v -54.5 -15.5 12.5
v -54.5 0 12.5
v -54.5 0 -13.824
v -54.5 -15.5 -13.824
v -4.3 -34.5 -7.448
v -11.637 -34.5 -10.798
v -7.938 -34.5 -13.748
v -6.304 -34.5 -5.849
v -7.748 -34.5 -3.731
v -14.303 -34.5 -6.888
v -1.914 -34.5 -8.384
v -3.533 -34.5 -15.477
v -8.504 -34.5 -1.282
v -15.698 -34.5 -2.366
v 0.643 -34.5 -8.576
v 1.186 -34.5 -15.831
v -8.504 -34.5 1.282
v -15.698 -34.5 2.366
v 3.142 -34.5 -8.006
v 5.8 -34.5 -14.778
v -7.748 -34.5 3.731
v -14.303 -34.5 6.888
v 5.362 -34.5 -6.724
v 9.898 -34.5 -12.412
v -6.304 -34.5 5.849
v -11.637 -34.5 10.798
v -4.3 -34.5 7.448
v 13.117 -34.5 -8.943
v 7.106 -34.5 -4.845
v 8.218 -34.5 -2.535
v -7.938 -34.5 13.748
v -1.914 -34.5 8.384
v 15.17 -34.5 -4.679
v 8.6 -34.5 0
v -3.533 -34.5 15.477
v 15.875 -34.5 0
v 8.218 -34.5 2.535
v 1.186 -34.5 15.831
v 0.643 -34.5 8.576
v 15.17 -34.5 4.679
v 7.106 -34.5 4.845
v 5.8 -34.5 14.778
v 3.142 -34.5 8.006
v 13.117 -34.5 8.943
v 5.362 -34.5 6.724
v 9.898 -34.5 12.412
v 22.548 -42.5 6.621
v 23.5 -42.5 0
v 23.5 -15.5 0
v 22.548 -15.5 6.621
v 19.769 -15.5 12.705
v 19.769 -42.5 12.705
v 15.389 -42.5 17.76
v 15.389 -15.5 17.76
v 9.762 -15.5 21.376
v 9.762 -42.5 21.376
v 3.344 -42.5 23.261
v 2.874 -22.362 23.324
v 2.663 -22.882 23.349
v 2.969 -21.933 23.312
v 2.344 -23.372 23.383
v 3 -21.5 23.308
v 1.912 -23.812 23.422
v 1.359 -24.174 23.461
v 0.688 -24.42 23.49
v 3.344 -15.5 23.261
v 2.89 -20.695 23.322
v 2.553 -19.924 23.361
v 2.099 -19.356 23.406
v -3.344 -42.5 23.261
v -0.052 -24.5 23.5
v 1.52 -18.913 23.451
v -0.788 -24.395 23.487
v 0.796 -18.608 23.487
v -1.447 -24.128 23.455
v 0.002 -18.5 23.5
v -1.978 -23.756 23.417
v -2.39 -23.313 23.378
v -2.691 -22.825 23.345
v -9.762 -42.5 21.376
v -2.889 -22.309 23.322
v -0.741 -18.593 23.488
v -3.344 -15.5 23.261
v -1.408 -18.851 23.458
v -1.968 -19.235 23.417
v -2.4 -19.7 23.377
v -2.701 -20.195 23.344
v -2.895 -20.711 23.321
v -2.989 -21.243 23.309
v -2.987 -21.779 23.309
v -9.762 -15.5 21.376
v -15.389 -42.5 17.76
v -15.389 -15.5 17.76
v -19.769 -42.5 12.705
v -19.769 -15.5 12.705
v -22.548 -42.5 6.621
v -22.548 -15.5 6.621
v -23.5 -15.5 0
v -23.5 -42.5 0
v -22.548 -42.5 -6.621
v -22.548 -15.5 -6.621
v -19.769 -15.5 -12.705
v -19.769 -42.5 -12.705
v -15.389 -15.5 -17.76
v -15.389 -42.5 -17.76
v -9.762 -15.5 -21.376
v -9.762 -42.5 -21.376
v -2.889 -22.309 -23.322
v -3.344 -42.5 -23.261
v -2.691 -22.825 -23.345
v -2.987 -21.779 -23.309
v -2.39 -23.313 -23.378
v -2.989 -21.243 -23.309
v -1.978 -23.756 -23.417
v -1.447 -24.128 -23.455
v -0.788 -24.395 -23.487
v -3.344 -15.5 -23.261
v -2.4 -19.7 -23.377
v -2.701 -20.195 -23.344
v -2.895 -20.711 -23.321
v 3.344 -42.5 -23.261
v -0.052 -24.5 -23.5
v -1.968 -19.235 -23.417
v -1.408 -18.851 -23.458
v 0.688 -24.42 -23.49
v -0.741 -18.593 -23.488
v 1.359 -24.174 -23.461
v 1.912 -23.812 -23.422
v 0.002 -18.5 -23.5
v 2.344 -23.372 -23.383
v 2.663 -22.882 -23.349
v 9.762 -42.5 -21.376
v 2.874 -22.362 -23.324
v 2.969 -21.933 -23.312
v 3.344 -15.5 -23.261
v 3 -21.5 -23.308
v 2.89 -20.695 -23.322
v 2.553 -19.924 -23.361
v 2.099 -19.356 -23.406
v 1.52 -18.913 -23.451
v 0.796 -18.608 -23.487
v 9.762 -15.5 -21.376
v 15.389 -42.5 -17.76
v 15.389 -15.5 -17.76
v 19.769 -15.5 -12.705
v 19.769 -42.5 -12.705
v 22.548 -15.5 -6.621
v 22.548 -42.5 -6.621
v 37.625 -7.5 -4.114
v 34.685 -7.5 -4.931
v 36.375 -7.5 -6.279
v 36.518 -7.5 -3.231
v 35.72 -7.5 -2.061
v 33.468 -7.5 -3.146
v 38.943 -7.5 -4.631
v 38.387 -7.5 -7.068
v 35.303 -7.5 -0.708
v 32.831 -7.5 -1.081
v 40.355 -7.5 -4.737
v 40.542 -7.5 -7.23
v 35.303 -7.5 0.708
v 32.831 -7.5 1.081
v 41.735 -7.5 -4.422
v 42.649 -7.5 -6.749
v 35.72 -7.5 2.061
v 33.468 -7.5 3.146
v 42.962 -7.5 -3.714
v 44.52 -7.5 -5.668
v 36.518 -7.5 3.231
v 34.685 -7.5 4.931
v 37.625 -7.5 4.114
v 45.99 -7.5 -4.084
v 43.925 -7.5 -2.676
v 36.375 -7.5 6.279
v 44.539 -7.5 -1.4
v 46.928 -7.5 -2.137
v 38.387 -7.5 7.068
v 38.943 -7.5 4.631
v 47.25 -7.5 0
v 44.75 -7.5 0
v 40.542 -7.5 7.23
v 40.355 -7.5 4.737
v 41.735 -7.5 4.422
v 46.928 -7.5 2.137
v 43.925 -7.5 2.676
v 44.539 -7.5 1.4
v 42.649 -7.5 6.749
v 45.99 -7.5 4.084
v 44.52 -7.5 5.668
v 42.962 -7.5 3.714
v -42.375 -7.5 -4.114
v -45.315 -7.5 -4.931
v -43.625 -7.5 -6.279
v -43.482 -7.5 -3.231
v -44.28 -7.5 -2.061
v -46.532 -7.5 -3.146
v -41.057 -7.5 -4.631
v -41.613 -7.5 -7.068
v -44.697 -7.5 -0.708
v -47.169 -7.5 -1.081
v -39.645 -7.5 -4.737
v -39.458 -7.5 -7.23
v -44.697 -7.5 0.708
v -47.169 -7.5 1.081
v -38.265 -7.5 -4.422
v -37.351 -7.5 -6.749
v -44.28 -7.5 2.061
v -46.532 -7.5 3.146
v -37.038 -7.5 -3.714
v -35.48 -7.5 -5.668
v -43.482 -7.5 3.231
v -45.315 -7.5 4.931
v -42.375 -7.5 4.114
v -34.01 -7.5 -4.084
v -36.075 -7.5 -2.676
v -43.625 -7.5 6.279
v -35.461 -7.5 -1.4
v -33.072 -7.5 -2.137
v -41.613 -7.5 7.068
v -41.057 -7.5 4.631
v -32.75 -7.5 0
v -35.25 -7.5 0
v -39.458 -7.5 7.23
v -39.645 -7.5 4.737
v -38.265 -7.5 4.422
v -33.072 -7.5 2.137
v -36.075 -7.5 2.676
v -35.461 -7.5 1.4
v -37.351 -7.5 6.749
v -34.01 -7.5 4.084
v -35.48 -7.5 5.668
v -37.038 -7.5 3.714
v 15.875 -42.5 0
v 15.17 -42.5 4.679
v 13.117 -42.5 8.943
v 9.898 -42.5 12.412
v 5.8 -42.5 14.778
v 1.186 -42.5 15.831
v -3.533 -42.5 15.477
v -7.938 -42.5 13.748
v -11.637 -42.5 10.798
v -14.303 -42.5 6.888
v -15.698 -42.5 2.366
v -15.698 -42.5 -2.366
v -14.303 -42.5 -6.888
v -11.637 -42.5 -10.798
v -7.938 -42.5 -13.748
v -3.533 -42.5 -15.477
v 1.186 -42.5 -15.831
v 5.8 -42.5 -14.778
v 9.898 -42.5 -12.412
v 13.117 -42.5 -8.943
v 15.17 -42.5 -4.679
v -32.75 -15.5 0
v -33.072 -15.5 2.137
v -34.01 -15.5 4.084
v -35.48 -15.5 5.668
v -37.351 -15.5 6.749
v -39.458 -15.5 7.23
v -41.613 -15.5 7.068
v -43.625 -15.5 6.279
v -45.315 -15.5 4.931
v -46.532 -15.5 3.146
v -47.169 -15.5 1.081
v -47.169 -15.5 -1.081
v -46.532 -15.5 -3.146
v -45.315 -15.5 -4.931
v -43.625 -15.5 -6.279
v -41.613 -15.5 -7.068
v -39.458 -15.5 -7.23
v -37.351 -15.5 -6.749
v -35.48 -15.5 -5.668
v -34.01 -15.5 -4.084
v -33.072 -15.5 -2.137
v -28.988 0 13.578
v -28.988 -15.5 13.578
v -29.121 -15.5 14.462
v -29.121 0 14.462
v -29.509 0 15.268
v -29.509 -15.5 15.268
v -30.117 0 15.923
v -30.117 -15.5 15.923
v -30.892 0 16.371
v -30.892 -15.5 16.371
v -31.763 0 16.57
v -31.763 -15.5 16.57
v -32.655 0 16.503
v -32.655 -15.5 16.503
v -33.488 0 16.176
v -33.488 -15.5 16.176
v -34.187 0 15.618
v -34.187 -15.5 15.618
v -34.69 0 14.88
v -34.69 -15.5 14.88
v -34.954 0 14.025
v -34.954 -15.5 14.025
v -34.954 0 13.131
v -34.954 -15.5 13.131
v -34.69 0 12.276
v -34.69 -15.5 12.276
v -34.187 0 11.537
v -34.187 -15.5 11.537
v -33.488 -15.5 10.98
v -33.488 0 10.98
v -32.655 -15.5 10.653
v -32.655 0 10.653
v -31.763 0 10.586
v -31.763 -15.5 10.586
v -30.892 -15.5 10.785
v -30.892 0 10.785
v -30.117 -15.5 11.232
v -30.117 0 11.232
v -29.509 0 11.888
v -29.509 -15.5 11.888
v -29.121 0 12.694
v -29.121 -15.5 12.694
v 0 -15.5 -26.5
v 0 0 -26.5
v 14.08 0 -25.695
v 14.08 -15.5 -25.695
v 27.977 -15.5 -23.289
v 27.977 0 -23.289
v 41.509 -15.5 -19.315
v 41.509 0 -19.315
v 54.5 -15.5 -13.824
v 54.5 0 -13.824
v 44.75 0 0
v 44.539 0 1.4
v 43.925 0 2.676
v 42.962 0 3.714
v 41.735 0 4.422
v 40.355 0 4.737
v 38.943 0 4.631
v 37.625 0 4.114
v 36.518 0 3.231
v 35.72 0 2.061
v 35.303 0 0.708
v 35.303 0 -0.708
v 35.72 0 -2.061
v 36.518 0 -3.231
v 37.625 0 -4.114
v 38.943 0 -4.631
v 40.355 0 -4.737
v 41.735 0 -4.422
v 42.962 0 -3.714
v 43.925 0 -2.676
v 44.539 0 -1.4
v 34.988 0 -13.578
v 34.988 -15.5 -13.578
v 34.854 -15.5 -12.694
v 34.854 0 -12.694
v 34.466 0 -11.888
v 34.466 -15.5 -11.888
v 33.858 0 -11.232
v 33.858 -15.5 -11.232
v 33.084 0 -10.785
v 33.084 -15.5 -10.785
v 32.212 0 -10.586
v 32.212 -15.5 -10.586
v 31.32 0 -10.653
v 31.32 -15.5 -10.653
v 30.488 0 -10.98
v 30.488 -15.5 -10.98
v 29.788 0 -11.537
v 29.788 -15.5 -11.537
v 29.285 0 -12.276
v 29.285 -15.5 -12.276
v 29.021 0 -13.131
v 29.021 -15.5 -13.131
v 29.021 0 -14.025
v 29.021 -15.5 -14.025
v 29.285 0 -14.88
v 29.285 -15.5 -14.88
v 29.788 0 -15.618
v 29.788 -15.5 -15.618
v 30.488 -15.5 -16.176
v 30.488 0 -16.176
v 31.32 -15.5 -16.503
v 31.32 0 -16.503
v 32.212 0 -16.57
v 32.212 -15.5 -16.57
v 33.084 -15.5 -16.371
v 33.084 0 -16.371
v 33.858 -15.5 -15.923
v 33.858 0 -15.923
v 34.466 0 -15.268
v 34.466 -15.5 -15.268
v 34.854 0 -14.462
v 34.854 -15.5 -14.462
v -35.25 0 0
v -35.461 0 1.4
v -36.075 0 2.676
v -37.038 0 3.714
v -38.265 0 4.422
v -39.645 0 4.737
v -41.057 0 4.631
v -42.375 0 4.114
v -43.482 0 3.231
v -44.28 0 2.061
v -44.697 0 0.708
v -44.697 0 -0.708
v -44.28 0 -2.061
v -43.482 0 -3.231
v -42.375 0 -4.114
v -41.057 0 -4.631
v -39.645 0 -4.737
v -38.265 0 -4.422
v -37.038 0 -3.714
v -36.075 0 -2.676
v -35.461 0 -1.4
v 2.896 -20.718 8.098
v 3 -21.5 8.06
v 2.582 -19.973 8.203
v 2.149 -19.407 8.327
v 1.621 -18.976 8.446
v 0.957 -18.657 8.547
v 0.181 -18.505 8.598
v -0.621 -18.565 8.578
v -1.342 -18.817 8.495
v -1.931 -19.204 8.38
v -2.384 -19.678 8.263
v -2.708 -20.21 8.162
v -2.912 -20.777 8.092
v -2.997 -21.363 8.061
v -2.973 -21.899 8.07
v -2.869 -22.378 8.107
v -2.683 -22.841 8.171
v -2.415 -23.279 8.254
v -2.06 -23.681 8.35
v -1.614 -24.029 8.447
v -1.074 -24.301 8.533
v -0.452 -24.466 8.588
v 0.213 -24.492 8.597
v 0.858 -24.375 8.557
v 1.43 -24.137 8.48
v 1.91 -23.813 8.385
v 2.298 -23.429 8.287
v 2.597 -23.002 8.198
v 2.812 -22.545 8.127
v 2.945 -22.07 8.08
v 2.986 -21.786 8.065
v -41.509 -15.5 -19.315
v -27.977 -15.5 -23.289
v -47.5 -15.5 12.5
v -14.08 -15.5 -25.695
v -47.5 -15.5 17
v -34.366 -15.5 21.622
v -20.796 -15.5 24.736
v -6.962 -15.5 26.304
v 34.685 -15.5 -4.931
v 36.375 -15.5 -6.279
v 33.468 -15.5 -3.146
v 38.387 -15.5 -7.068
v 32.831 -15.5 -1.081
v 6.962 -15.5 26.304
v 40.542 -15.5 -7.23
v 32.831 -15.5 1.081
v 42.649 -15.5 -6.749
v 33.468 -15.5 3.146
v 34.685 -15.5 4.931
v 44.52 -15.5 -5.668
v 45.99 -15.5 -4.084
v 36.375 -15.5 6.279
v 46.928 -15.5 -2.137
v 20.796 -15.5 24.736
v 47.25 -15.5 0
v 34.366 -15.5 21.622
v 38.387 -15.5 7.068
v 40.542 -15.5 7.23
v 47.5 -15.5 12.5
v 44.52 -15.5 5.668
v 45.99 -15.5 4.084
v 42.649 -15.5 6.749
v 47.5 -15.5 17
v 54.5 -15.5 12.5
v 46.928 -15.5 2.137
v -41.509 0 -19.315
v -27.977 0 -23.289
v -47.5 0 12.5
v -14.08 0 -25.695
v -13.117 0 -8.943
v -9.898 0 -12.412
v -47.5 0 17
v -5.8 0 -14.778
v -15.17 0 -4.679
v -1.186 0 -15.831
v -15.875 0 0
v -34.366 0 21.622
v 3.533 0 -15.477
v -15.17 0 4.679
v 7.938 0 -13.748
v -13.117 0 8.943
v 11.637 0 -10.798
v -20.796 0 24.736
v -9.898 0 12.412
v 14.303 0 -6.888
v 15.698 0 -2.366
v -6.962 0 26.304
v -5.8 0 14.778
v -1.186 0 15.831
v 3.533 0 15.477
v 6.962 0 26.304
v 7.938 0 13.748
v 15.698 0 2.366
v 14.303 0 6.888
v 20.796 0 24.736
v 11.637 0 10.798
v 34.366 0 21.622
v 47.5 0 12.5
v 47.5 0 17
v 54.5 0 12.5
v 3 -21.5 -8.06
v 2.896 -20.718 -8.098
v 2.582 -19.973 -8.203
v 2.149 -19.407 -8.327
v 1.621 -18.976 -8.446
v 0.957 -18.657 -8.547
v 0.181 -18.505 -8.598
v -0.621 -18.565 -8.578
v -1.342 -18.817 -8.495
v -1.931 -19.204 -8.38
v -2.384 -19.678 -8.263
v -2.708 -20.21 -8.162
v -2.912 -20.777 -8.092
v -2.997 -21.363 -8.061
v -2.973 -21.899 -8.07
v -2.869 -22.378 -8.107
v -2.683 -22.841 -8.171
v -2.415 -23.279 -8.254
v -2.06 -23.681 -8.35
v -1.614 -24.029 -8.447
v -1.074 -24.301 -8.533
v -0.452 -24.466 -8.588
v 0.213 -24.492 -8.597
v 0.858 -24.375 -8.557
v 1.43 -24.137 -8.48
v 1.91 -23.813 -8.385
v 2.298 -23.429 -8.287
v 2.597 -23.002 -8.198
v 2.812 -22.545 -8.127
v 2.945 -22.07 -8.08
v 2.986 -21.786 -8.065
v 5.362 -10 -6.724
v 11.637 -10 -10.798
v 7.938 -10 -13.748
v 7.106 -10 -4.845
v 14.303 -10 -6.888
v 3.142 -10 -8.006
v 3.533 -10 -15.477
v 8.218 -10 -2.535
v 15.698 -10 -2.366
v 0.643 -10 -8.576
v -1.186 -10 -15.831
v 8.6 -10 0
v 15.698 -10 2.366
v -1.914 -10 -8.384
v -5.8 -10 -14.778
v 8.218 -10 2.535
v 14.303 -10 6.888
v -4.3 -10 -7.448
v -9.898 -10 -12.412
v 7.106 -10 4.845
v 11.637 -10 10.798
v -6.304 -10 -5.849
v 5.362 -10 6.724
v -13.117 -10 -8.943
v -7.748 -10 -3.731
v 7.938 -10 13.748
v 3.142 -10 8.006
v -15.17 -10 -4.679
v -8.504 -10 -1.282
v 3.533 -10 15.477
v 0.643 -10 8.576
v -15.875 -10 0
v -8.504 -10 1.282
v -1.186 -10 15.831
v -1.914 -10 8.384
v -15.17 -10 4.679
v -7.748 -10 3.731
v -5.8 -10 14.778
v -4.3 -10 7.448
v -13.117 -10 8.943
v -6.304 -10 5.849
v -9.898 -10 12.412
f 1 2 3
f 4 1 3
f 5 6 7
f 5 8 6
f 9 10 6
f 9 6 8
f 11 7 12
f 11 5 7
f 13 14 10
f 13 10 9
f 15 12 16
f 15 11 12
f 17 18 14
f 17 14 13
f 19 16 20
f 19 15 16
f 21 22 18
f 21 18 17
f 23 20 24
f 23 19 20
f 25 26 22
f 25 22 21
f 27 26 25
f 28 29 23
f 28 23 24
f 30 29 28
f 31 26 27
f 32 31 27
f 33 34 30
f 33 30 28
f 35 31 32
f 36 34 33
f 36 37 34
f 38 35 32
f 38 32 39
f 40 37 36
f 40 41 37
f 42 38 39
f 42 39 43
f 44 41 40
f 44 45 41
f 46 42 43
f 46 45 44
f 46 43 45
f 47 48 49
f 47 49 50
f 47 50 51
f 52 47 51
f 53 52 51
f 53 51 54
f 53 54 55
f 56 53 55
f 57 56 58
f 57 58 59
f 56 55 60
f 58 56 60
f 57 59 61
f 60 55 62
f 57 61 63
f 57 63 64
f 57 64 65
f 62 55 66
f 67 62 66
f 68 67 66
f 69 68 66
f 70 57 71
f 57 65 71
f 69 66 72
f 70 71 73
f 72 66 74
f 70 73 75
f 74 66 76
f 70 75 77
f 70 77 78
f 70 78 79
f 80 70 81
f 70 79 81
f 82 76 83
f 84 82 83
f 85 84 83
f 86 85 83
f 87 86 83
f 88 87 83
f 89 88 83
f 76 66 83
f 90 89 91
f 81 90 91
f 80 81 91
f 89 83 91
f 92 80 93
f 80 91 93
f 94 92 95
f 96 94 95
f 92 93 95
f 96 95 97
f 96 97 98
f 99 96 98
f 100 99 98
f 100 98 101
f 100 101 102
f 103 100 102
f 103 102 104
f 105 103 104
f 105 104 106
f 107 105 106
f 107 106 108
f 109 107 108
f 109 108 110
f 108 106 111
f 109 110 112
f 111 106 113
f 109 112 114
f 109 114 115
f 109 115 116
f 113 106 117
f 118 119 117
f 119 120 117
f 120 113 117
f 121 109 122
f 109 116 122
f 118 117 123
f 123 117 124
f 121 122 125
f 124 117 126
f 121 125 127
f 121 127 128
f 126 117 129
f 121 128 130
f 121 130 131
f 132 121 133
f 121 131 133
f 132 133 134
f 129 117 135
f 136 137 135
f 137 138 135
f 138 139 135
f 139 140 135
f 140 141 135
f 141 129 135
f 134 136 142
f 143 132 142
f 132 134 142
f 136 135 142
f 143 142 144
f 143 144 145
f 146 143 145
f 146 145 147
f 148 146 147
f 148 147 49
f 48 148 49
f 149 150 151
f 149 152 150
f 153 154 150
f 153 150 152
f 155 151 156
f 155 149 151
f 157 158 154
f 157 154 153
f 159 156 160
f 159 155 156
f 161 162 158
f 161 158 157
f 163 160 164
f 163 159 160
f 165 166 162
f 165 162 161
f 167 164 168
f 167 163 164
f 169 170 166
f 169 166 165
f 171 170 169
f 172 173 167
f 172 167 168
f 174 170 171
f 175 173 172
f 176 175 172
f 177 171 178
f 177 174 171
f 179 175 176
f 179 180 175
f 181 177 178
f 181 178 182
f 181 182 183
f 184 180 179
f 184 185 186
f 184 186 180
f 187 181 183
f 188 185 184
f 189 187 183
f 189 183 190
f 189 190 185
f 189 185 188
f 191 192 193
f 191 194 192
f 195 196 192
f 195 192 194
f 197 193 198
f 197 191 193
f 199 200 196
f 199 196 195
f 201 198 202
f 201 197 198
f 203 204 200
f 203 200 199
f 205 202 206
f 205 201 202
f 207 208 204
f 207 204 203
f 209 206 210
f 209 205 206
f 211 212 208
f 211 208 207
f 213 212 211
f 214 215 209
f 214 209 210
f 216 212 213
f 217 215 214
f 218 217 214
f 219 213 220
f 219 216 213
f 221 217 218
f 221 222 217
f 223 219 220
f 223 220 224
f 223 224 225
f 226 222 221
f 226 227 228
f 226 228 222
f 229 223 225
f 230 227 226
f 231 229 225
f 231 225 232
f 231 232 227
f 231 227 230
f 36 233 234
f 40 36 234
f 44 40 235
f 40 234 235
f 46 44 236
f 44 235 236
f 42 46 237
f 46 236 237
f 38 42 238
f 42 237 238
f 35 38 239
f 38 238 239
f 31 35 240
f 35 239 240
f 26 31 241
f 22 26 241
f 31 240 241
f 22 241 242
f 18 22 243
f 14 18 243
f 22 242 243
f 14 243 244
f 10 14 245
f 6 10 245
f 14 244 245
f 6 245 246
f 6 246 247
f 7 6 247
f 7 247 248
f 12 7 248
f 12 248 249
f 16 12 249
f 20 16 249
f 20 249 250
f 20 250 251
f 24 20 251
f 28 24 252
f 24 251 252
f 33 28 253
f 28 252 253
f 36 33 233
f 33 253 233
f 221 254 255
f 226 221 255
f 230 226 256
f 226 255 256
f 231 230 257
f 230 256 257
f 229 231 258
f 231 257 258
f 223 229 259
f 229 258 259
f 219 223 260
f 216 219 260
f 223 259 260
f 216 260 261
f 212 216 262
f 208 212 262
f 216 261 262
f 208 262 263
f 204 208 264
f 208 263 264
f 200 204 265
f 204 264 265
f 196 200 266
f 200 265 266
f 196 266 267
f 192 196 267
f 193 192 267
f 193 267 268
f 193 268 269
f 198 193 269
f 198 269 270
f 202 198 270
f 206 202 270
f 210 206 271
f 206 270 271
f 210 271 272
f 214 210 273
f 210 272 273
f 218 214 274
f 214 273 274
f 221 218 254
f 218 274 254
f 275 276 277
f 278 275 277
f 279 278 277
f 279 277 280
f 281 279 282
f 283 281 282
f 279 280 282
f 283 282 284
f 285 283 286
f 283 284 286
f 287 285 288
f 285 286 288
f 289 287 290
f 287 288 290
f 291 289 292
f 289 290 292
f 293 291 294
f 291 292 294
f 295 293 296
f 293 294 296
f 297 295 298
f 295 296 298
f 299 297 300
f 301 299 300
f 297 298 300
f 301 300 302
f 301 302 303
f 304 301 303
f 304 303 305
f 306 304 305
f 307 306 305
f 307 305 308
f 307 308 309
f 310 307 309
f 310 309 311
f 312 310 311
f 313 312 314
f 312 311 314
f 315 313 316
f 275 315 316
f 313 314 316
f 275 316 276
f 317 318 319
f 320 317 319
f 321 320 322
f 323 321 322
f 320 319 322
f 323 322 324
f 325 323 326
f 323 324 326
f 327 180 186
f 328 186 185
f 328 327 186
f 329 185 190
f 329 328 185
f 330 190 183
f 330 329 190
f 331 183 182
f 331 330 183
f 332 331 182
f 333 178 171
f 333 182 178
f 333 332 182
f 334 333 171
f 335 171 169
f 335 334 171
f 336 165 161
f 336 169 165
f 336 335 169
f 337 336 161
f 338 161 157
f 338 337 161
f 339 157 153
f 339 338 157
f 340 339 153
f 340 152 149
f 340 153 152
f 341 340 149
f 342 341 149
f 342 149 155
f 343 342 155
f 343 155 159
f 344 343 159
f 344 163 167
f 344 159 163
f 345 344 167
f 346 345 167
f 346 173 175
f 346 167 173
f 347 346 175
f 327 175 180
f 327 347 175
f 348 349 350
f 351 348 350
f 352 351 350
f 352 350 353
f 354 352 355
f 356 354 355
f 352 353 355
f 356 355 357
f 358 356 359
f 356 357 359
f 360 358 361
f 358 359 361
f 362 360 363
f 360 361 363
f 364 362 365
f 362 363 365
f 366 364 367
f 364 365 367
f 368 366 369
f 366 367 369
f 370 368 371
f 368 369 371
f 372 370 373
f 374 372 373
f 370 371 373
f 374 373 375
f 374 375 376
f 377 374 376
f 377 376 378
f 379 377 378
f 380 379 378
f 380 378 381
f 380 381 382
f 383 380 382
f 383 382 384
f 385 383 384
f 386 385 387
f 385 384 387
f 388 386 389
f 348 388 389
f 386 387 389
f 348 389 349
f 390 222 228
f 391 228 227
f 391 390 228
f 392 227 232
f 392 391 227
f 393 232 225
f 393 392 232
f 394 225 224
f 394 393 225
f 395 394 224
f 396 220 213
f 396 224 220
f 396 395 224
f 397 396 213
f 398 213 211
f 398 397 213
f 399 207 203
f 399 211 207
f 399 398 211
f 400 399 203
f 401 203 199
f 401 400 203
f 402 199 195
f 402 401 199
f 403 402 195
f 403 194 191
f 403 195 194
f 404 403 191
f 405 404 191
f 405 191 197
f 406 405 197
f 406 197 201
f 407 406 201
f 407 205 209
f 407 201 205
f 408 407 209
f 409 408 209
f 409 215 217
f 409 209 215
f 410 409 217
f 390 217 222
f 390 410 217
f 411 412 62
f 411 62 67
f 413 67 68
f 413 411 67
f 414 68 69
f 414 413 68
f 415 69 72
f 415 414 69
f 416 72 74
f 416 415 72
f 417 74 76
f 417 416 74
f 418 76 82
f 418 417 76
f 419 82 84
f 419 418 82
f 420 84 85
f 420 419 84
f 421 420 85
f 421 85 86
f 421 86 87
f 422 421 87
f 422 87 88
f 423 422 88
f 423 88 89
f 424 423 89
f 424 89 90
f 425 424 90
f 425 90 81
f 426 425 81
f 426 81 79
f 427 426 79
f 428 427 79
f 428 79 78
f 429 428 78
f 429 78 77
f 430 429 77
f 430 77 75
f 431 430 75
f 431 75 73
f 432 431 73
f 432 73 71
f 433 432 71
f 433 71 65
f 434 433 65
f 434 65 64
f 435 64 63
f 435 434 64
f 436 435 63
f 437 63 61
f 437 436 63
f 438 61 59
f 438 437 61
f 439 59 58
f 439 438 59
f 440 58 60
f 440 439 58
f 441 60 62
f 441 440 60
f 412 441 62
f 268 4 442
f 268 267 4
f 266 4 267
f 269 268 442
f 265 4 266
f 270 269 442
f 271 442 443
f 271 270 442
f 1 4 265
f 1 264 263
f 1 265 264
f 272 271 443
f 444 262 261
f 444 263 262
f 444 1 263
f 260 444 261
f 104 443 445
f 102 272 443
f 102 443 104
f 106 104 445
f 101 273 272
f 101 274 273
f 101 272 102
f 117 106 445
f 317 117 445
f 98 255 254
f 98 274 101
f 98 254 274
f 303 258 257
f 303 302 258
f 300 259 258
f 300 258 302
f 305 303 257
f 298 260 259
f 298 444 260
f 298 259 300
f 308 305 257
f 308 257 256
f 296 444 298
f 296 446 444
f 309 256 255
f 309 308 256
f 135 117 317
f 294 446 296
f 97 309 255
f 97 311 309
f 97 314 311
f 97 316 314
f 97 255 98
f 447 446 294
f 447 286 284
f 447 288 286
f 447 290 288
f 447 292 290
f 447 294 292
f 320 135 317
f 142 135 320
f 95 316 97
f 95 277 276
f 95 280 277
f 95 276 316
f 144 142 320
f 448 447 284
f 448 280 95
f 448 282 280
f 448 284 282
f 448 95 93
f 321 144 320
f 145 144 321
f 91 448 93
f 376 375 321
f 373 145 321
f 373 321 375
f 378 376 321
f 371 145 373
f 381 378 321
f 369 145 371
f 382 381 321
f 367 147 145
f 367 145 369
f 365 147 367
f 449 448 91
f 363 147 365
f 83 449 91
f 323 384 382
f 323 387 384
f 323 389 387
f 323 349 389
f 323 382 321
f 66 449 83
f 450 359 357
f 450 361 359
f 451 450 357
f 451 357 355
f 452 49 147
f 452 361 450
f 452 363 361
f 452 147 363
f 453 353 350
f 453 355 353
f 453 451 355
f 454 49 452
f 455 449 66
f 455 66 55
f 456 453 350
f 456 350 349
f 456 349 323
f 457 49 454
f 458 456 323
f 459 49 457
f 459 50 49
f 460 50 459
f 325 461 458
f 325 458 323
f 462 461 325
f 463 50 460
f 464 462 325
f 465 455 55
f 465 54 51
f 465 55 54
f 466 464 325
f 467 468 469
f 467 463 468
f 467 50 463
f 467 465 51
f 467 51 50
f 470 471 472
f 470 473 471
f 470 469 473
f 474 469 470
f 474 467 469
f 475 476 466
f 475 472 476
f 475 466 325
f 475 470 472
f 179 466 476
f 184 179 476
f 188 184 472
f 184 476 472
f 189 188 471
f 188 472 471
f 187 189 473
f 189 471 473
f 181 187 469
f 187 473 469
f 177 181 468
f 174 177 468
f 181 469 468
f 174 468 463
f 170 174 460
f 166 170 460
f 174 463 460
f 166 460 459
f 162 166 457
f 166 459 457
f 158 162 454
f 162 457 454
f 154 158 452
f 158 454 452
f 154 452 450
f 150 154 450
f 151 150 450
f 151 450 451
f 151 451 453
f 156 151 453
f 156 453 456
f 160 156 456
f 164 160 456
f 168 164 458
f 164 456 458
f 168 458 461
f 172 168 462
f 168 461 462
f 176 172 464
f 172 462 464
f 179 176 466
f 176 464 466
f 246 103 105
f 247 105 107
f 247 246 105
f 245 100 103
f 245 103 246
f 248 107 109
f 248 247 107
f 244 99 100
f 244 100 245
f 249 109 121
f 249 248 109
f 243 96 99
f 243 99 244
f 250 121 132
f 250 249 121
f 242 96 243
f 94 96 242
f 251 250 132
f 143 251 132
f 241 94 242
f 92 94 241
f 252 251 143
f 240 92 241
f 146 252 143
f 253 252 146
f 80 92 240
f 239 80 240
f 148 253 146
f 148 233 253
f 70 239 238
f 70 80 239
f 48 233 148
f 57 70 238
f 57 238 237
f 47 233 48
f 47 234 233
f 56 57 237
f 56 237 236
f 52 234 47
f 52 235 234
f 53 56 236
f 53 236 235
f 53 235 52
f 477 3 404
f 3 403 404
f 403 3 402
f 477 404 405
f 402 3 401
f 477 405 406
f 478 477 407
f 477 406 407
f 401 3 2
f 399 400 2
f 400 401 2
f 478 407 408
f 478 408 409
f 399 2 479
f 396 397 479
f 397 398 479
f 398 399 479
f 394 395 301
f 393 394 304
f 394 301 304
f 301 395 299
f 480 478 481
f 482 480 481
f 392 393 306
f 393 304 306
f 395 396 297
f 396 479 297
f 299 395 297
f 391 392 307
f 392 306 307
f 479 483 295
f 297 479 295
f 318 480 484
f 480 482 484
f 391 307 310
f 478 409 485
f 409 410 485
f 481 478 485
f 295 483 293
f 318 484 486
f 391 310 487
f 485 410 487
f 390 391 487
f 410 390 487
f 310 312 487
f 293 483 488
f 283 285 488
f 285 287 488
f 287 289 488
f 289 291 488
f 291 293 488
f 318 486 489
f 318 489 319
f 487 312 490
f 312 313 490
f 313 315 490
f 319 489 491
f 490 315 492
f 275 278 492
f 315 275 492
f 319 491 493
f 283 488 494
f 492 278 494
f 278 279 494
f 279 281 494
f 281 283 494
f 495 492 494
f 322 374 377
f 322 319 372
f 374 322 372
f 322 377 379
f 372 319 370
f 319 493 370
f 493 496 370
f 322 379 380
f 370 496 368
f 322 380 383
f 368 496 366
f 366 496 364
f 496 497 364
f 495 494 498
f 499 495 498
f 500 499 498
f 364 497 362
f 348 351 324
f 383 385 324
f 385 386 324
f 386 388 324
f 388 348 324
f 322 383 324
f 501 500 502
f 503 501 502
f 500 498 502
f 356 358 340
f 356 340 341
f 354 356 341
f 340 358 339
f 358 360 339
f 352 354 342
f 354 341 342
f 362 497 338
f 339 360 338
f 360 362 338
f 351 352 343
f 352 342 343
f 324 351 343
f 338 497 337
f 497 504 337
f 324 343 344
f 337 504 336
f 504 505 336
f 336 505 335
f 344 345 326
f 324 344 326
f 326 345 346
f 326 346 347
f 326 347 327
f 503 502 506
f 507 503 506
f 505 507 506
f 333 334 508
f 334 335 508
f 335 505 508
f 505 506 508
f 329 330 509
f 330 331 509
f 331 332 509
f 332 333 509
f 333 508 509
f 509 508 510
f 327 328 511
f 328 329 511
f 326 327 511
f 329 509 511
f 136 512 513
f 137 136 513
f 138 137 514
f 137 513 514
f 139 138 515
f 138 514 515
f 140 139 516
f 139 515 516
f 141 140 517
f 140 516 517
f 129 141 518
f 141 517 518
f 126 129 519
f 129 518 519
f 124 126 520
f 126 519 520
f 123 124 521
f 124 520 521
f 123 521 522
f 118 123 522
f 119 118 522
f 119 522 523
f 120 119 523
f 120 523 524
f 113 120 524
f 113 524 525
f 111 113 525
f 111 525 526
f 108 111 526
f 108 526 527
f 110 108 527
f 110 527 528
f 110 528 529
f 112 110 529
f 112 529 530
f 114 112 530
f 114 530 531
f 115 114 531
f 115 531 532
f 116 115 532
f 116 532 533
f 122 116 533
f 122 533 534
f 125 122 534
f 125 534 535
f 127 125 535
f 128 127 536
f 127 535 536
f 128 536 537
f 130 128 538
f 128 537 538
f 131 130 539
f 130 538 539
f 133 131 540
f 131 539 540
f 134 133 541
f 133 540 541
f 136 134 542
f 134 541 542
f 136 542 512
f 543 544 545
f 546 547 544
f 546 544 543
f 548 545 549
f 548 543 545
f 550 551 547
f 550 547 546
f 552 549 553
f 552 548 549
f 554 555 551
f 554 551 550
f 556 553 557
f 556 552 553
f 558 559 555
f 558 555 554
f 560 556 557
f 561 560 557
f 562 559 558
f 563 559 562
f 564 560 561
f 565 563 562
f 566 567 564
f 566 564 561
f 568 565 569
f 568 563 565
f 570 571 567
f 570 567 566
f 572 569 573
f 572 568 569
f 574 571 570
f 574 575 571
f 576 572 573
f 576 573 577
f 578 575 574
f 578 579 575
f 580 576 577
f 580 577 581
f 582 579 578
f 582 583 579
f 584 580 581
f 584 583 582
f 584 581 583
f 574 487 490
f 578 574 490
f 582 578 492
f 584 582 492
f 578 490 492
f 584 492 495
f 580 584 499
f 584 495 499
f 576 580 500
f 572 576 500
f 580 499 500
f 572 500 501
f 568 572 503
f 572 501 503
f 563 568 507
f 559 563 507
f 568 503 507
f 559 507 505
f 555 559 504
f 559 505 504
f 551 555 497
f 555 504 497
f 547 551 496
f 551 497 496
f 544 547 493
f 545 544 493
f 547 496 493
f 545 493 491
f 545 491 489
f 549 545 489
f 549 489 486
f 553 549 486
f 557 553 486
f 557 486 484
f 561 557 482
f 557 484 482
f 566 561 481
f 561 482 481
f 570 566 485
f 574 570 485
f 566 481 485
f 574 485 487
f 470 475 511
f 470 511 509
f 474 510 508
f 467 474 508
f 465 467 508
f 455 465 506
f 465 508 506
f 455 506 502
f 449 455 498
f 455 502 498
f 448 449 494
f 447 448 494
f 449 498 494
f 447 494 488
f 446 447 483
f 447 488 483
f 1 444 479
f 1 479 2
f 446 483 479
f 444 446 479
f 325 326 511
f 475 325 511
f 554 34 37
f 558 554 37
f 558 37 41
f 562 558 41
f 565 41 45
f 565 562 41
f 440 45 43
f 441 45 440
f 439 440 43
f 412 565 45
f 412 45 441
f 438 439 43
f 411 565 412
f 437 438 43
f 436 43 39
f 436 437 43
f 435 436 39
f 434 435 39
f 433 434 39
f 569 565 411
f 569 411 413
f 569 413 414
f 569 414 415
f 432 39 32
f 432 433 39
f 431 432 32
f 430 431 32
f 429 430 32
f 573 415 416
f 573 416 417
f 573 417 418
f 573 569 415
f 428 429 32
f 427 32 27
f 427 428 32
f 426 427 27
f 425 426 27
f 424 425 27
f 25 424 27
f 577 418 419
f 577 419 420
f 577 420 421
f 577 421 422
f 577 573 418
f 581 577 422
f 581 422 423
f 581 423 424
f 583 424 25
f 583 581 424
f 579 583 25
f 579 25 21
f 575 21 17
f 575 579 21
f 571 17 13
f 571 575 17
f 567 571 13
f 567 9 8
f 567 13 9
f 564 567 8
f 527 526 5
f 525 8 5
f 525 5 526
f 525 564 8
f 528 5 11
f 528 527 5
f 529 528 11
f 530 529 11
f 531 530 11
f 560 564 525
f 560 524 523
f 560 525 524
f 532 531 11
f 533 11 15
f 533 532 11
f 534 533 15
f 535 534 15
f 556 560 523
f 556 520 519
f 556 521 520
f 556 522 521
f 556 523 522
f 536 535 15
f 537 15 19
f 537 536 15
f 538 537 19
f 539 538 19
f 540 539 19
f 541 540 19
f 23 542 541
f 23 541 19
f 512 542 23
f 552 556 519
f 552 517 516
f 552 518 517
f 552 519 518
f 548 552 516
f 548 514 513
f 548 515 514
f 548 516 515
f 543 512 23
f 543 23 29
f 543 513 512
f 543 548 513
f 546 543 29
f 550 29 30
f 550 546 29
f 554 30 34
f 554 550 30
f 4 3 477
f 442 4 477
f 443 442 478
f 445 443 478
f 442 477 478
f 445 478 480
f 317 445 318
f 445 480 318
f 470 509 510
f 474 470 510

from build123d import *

# Parameters (mm, degrees)
F0_R           = 4.75
F0_R_2         = 8.6
F1_DEPTH       = 15.5
F2_R           = 7.25
F3_DEPTH       = 8
F4_R           = 23.5
F4_R_2         = 8.6
F5_DEPTH       = 27
F6_R           = 15.875
F7_DEPTH       = 8
F8_R           = 15.875
F9_DEPTH       = 10
F14_R          = 3
F15_DEPTH      = 25
F15_DEPTH_BACK = 25
F16_R          = 3
F17_DEPTH      = 15.5


with BuildPart() as f1:
    # F0 (on Front) → F1 (new body)
    with BuildSketch(Plane.XZ):
        with BuildLine():
            ThreePointArc((-54.5, -13.8241850861), (-27.977340312, -23.2893113667), (0, -26.5))
            ThreePointArc((0, -26.5), (27.977340312, -23.2893113667), (54.5, -13.8241850861))
            Line((54.5, -13.8241850861), (54.5, 12.5))
            Line((54.5, 12.5), (47.5, 12.5))
            Line((47.5, 12.5), (47.5, 17))
            ThreePointArc((47.5, 17), (0, 26.5), (-47.5, 17))
            Line((-47.5, 17), (-47.5, 12.5))
            Line((-47.5, 12.5), (-54.5, 12.5))
            Line((-54.5, 12.5), (-54.5, -13.8241850861))
        make_face()
        with Locations((-40, 0)):
            Circle(F0_R, mode=Mode.SUBTRACT)
        Circle(F0_R_2, mode=Mode.SUBTRACT)
        with Locations((40, 0)):
            Circle(F0_R, mode=Mode.SUBTRACT)
    extrude(amount=F1_DEPTH)

    # F2 (on face) → F3 (cut)
    with BuildSketch(Plane.XZ.offset(15.5)):
        with Locations((-40, 0)):
            Circle(F2_R)
        with Locations((40, 0)):
            Circle(F2_R)
    extrude(amount=-F3_DEPTH, mode=Mode.SUBTRACT)

    # F4 (on face) → F5 (join)
    with BuildSketch(Plane.XZ.offset(15.5)):
        Circle(F4_R)
        Circle(F4_R_2, mode=Mode.SUBTRACT)
    extrude(amount=F5_DEPTH)

    # F6 (on face) → F7 (cut)
    with BuildSketch(Plane.XZ.offset(42.5)):
        Circle(F6_R)
    extrude(amount=-F7_DEPTH, mode=Mode.SUBTRACT)

    # F8 (on face) → F9 (cut)
    with BuildSketch(Plane(origin=(0, 0, 0), x_dir=(-1, 0, 0), z_dir=(0, 1, 0))):
        Circle(F8_R)
    extrude(amount=-F9_DEPTH, mode=Mode.SUBTRACT)

    # F14 (on 3pt) → F15 (cut, two sides)
    with BuildSketch(Plane.XY.offset(-0.6620925431)) as f15_sk:
        with Locations((0, -21.5)):
            Circle(F14_R)
    extrude(amount=F15_DEPTH, mode=Mode.SUBTRACT)
    extrude(f15_sk.sketch, amount=-F15_DEPTH_BACK, mode=Mode.SUBTRACT)

    # F16 (on face) → F17 (cut, through all)
    with BuildSketch(Plane.XZ.offset(15.5)):
        with Locations((-31.9875436575, 13.577906715)):
            Circle(F16_R)
        with Locations((31.9875436575, -13.577906715)):
            Circle(F16_R)
    extrude(amount=-F17_DEPTH, mode=Mode.SUBTRACT)


solid = f1.part
